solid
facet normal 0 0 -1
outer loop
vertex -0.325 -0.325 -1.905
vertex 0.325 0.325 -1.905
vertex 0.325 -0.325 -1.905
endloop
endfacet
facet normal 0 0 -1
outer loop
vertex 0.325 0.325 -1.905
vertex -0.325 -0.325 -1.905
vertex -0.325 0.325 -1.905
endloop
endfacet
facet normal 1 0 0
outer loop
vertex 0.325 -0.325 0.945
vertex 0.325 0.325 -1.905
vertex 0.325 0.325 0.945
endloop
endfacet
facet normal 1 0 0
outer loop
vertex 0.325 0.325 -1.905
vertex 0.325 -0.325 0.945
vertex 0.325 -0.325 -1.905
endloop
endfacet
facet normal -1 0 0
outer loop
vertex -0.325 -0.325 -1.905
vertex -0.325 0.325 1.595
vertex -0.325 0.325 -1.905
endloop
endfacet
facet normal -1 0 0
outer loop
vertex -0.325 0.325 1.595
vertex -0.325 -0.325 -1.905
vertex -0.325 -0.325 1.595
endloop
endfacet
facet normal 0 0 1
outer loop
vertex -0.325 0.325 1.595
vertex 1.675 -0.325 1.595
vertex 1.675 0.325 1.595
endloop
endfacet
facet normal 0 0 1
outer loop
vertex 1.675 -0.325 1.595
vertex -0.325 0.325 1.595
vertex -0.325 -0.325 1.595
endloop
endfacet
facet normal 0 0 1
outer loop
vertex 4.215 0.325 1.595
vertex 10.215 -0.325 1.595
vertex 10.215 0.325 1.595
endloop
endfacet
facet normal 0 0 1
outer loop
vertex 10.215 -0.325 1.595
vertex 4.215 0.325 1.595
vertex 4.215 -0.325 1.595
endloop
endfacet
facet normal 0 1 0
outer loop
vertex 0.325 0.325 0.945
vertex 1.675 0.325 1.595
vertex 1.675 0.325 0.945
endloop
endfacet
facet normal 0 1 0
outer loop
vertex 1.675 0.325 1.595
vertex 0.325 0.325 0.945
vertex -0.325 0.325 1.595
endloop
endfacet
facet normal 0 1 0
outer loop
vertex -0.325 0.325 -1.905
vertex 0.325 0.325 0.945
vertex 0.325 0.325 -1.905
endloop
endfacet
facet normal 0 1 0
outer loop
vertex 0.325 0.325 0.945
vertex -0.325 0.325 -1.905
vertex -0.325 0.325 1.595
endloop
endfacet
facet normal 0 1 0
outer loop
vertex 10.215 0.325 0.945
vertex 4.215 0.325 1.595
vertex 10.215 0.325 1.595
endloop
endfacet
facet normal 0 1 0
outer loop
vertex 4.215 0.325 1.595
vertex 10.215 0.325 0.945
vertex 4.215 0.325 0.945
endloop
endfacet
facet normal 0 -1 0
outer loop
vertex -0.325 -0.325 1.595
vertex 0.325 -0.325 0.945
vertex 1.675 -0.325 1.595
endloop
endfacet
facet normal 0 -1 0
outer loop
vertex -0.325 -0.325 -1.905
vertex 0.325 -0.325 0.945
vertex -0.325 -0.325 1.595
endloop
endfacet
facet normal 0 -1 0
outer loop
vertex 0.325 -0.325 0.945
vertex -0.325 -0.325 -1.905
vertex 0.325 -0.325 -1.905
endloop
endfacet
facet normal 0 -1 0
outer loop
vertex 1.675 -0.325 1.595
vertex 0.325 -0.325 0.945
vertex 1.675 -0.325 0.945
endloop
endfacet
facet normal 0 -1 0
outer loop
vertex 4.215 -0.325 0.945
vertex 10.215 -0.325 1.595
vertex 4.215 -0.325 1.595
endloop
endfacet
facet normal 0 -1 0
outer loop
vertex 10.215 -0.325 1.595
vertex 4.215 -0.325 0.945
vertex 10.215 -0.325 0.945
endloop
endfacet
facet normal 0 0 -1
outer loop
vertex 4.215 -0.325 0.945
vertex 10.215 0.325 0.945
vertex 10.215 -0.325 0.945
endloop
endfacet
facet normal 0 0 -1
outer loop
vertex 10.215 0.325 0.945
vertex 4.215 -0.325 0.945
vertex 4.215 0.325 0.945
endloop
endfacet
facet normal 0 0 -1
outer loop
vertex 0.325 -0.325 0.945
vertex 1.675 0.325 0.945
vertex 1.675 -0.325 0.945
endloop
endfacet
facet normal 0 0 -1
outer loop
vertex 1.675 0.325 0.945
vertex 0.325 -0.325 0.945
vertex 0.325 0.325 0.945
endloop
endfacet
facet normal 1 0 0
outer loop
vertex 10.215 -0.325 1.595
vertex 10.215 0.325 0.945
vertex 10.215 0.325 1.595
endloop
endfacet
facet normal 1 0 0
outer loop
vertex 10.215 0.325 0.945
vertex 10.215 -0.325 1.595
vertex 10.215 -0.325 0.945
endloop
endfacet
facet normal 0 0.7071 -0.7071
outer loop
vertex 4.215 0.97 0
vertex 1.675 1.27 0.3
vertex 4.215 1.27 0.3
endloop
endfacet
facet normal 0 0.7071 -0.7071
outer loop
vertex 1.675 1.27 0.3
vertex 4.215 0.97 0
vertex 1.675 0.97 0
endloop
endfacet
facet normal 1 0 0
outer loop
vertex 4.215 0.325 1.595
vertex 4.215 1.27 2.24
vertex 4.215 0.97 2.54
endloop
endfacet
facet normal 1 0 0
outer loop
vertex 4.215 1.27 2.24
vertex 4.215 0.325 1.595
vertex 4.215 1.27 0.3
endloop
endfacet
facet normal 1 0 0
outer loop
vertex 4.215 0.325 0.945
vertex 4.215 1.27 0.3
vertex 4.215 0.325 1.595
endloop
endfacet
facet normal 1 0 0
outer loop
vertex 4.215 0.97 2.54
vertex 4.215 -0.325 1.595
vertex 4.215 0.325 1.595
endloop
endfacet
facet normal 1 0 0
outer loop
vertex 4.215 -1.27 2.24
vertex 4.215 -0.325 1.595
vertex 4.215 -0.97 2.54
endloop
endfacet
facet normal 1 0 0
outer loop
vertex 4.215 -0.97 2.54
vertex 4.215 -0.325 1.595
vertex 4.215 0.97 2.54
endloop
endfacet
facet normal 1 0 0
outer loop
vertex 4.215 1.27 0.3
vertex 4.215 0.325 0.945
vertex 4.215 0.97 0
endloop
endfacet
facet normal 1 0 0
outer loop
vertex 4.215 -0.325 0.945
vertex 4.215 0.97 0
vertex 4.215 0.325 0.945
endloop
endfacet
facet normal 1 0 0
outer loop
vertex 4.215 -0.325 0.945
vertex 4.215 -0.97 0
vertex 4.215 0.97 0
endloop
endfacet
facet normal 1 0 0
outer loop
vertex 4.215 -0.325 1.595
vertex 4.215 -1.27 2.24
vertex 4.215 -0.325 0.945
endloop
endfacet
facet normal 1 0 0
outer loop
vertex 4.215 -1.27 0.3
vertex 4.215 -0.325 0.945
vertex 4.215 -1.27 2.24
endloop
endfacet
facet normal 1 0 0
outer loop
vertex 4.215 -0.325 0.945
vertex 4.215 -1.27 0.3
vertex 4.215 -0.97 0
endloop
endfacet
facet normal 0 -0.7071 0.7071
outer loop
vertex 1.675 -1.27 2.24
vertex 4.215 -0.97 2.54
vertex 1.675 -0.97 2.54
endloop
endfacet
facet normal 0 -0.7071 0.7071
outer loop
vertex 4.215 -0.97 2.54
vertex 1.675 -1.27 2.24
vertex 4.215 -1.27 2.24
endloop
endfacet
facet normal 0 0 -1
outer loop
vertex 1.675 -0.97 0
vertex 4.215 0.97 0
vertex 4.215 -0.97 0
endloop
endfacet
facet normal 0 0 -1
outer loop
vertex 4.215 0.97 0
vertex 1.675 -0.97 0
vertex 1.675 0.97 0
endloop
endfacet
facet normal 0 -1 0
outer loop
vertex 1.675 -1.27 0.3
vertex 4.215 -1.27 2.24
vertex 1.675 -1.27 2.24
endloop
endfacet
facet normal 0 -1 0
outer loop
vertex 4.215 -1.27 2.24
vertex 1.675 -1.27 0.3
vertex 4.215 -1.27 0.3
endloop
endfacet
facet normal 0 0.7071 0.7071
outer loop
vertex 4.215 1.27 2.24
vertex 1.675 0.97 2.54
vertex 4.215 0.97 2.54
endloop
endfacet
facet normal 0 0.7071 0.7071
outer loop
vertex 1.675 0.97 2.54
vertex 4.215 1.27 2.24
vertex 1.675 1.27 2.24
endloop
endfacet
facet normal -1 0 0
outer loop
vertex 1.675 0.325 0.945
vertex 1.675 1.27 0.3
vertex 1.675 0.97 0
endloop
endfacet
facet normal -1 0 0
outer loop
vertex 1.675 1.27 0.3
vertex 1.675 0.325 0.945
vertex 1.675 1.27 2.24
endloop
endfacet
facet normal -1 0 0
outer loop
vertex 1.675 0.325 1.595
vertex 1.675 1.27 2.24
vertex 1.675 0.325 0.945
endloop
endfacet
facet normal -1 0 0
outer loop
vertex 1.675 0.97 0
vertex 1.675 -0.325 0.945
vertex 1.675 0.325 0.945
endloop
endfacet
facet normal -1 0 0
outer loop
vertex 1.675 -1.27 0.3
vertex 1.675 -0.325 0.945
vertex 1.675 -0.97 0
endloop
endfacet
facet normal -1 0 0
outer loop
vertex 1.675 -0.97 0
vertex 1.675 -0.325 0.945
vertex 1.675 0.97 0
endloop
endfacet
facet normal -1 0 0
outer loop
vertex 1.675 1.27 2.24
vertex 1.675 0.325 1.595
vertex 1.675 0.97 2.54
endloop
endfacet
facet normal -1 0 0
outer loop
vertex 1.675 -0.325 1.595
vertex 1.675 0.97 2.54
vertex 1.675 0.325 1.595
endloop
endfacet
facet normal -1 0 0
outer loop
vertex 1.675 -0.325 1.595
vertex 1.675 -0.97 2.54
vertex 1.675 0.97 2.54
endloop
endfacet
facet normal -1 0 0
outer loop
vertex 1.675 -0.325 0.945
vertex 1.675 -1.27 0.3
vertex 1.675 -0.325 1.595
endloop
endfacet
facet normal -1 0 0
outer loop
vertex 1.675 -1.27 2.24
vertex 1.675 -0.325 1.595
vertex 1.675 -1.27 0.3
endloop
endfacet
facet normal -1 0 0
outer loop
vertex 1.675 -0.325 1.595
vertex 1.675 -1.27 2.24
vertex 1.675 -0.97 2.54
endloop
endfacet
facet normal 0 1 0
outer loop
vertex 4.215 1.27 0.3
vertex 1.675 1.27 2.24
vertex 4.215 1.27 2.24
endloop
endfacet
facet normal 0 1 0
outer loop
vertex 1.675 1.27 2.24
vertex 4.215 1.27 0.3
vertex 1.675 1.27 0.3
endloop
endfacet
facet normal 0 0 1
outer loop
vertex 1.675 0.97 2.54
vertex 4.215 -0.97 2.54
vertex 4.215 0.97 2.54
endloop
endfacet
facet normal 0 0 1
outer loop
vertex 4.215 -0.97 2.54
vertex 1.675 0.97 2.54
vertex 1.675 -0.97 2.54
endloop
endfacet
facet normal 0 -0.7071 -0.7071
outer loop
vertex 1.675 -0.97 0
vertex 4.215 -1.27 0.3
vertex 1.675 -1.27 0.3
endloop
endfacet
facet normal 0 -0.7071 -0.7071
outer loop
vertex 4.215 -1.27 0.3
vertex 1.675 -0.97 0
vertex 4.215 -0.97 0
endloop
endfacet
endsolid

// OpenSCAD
plastic_color = "#303030";
pin_color = "#FFC000";

module pin_header_angle()
{
    translate([2-0.65/2,0,1.27])
    rotate([0,90,0])
    union()
    {
        color(pin_color)
        translate([-0.325,-0.325,-2])
        cube([3.5,0.65,0.65]);

        color(pin_color)
        translate([-0.325,-0.325,-2])
        cube([0.65,0.65,10.54]);

        color(plastic_color)
        linear_extrude(2.54)
        polygon(points=[[-0.97,-1.27],[0.97,-1.27],[1.27,-0.97],[1.27,0.97],[0.97,1.27],[-0.97,1.27],[-1.27,0.97],[-1.27,-0.97]], paths=[[0,1,2,3,4,5,6,7]]);
    }
}

pin_header_angle();
